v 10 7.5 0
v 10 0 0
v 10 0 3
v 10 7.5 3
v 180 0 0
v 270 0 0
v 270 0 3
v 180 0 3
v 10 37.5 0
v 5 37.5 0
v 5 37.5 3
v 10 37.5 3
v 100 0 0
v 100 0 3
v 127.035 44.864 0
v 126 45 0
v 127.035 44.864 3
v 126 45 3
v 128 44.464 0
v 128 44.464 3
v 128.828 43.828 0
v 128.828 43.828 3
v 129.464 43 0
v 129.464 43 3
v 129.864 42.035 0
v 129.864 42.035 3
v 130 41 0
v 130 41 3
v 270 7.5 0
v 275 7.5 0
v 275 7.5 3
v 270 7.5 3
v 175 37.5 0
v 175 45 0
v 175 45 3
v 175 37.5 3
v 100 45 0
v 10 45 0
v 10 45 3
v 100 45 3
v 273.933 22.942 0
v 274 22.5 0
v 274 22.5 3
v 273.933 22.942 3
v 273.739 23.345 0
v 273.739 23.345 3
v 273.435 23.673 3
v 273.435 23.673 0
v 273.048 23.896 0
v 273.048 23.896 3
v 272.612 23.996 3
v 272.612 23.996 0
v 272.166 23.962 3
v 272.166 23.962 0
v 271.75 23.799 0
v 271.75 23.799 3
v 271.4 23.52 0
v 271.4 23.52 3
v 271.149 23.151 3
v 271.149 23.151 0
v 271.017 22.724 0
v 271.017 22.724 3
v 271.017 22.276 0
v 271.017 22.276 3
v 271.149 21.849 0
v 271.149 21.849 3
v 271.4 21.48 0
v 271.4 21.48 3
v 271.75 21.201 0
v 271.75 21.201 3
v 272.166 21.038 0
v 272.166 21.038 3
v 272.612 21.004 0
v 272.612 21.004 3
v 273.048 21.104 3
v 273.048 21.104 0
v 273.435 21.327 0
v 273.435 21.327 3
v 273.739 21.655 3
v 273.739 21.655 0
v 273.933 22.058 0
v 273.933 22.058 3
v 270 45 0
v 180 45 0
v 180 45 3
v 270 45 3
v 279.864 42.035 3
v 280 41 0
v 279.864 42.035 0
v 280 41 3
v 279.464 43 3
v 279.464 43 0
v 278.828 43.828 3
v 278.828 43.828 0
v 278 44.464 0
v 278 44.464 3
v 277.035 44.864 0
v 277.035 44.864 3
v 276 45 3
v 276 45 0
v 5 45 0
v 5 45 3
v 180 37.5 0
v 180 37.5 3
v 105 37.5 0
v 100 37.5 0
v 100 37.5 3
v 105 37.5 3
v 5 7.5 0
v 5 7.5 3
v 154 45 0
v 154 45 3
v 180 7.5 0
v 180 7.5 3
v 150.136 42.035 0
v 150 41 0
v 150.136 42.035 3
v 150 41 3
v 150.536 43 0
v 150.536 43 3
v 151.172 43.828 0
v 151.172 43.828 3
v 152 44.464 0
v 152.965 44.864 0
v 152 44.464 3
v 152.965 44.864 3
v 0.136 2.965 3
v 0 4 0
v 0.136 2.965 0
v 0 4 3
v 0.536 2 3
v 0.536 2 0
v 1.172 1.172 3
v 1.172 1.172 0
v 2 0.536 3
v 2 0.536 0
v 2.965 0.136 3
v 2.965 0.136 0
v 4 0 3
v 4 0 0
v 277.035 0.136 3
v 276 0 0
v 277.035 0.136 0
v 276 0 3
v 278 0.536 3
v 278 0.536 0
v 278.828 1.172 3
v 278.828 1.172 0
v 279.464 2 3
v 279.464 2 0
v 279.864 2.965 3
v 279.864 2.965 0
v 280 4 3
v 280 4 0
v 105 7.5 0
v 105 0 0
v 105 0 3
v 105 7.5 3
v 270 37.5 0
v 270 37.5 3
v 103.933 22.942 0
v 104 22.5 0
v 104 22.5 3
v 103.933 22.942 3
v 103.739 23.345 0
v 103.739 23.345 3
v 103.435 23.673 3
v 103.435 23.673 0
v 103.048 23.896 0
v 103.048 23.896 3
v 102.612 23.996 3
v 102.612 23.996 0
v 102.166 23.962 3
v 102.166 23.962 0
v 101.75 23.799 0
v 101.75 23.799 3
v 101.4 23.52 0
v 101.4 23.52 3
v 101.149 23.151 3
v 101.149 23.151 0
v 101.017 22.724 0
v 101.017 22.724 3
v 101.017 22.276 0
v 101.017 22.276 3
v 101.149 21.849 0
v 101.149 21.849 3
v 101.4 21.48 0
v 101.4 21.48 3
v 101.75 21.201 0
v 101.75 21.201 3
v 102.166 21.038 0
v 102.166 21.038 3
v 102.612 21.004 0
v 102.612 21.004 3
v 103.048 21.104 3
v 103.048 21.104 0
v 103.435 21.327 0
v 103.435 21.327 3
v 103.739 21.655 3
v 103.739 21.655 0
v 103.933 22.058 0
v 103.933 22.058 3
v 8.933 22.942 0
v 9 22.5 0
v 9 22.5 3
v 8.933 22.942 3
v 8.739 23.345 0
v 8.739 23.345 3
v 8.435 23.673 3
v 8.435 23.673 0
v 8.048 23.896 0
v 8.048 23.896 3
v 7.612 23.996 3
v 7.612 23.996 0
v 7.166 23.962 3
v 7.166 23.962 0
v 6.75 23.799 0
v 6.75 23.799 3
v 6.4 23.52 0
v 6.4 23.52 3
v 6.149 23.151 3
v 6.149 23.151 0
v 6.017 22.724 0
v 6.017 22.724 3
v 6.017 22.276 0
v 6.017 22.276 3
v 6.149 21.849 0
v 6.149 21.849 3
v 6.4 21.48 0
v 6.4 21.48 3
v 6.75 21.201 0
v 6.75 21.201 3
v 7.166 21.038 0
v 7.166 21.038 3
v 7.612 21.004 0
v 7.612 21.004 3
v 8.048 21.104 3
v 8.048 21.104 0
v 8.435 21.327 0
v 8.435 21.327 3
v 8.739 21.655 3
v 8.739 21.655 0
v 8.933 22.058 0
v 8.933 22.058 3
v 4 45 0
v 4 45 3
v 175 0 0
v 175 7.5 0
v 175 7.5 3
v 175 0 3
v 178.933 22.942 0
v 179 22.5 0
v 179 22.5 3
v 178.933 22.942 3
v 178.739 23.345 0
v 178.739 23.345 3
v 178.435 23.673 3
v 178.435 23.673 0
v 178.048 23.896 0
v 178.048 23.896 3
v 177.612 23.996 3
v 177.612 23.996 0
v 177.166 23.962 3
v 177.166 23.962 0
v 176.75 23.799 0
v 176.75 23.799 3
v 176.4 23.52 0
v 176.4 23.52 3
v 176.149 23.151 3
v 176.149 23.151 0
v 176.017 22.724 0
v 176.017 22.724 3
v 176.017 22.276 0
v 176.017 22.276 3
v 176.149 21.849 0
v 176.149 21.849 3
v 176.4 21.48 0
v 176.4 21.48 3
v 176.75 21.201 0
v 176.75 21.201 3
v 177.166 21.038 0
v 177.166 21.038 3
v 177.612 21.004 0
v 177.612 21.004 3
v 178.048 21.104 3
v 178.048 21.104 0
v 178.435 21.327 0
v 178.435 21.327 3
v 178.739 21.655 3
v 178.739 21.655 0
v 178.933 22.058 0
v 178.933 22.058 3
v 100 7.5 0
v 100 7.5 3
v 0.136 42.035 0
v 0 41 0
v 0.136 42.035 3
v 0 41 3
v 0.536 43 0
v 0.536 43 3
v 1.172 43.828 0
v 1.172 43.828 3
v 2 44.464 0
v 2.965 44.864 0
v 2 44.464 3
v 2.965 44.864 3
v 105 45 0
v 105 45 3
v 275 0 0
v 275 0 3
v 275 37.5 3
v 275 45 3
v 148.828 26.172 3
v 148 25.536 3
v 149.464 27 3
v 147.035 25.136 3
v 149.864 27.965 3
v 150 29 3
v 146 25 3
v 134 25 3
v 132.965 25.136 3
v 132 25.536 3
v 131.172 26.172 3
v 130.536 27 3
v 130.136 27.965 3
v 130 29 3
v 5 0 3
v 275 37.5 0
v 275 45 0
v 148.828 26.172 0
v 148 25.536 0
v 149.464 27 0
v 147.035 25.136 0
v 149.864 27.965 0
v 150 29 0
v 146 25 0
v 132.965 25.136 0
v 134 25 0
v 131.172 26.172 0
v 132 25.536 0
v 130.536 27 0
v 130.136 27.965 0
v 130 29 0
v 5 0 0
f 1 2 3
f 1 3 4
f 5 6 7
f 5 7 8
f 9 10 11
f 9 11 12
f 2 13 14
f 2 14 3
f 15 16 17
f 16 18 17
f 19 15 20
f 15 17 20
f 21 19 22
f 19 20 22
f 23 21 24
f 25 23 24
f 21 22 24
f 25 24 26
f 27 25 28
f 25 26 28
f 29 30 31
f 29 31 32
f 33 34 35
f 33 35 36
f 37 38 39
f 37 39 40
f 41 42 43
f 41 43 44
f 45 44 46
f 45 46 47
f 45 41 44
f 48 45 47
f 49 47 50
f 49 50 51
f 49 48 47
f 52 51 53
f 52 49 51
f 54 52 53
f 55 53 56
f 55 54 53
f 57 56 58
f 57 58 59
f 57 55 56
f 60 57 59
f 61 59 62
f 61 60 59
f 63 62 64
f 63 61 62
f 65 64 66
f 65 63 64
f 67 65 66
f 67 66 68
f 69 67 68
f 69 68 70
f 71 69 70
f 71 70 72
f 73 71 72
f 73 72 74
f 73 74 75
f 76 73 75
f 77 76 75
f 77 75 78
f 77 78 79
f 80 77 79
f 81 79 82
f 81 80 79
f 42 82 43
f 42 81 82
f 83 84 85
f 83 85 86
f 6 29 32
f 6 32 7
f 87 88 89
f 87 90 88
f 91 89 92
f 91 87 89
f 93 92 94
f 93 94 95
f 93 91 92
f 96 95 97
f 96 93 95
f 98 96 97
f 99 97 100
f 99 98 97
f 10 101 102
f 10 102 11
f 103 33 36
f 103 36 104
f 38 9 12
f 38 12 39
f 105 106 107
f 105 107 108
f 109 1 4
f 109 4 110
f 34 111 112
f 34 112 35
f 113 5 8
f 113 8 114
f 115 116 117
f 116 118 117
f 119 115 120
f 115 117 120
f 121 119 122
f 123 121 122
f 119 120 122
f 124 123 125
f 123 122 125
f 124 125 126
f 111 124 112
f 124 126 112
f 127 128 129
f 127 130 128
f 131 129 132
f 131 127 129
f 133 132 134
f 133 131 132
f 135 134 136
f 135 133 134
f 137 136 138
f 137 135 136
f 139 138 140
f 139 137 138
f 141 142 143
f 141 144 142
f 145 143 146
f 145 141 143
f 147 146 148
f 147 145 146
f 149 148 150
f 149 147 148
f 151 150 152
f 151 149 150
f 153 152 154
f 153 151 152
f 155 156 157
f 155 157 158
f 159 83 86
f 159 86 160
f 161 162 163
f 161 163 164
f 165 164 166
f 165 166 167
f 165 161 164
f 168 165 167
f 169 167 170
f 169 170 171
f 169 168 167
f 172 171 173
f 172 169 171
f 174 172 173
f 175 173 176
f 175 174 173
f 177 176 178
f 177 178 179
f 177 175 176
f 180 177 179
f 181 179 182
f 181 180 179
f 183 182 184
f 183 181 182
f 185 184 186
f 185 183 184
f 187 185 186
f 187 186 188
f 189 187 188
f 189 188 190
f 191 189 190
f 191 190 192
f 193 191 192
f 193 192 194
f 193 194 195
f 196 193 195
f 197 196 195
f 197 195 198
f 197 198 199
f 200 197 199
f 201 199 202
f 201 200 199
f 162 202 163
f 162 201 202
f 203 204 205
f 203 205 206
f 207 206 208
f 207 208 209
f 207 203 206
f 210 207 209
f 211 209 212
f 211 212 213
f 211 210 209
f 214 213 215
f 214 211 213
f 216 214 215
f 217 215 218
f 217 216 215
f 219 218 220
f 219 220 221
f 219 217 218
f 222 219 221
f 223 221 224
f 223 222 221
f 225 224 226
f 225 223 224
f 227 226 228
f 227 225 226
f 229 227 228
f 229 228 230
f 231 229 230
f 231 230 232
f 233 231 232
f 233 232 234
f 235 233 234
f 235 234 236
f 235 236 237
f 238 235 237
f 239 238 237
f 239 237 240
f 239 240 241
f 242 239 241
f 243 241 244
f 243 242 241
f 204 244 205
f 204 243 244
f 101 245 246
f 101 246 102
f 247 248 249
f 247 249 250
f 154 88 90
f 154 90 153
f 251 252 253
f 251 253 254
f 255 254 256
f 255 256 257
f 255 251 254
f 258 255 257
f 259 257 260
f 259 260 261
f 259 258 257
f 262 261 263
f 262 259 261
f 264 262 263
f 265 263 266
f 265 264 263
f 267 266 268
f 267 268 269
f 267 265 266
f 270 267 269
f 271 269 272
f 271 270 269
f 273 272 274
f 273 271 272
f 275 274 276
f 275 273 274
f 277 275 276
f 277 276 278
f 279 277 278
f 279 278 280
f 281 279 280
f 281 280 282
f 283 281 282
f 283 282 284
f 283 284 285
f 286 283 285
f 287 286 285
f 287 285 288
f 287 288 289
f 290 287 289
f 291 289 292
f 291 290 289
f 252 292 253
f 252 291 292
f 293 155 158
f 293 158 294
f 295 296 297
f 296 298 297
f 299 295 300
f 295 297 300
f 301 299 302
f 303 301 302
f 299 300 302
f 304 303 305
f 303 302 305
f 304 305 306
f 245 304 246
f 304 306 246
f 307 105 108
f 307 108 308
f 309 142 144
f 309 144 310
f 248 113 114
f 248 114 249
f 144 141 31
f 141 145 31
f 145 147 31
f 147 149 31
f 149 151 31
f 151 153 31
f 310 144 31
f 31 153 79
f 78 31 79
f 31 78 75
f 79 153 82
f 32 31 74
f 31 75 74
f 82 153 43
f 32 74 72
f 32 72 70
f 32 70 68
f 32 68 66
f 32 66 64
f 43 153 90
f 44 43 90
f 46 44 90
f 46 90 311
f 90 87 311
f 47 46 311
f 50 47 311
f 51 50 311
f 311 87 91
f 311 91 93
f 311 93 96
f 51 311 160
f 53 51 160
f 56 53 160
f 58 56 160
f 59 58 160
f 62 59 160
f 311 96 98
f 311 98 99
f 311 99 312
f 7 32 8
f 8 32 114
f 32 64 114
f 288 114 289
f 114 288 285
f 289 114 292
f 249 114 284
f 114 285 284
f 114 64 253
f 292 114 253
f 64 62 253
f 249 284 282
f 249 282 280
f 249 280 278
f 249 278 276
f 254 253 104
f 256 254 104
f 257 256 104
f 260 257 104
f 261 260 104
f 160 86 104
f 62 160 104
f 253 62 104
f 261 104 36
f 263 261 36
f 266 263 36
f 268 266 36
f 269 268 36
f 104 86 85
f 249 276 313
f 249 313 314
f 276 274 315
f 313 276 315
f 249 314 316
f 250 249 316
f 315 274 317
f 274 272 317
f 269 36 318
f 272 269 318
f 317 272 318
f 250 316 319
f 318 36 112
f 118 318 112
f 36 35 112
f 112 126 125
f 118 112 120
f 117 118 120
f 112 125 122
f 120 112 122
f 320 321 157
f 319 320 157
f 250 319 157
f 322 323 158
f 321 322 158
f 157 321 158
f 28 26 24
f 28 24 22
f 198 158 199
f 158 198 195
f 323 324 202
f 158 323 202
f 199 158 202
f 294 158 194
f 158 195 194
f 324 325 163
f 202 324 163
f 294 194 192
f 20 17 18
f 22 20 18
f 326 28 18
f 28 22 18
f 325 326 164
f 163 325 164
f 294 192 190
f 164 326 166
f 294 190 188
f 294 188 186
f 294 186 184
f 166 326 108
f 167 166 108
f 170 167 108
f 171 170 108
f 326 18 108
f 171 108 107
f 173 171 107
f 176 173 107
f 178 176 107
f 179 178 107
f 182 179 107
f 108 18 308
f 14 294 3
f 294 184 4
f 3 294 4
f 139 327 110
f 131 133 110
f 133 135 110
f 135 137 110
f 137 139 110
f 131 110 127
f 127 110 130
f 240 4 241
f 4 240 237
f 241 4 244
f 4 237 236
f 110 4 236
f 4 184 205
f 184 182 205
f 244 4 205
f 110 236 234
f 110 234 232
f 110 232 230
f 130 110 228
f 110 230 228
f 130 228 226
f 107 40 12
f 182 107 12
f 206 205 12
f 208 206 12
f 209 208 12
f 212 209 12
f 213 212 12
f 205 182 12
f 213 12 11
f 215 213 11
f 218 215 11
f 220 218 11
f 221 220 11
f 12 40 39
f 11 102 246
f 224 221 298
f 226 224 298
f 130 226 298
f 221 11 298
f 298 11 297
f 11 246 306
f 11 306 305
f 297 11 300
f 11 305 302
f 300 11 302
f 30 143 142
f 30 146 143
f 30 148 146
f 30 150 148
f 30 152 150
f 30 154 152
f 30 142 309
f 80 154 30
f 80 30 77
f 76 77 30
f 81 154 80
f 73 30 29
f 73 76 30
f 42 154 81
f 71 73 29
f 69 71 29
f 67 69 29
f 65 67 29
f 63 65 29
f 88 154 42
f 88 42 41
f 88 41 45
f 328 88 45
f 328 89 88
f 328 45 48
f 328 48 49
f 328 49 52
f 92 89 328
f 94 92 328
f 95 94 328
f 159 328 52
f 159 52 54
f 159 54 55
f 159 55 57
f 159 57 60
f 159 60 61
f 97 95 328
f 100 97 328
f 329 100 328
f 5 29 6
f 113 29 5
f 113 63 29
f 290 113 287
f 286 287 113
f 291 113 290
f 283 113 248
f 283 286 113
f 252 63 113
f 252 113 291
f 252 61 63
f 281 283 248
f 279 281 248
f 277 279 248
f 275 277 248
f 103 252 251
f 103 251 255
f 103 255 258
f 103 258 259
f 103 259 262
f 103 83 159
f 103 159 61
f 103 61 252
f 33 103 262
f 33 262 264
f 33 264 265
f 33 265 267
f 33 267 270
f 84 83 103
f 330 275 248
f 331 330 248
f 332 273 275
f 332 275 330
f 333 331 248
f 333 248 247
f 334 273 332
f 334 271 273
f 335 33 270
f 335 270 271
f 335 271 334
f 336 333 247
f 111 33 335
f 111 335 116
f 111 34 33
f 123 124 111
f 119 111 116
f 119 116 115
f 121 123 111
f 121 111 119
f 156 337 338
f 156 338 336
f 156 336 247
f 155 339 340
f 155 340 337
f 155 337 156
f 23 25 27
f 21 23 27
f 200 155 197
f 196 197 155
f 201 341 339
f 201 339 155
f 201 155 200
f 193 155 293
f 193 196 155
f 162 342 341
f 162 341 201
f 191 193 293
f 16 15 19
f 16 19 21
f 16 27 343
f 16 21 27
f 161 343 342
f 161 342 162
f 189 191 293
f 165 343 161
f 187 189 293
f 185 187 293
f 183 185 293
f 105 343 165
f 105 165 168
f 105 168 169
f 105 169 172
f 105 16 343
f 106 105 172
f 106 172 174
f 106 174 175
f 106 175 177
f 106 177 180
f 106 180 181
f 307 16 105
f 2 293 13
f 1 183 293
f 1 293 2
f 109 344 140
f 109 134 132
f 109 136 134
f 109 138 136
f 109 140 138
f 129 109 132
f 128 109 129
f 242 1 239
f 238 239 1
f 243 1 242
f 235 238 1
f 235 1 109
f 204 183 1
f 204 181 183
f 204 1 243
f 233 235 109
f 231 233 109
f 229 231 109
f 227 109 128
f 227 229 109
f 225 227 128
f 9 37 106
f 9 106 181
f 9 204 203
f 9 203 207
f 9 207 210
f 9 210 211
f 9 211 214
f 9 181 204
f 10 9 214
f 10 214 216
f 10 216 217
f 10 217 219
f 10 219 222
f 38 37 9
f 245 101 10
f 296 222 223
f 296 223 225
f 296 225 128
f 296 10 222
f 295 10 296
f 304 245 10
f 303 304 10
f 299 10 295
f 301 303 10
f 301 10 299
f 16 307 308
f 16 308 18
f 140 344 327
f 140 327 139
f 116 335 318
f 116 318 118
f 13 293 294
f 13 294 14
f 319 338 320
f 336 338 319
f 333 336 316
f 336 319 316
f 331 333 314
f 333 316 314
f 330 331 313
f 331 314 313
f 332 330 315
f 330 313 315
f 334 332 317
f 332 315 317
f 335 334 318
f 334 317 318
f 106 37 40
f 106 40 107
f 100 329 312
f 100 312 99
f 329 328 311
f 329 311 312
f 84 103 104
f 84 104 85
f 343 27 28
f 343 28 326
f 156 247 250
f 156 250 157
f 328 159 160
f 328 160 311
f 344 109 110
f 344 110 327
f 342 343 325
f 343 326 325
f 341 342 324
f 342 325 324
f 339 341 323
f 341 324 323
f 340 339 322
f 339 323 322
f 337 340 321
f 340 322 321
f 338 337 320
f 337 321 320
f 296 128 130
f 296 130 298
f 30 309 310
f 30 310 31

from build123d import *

# Parameters (mm, degrees)
ESQUISSE1_R        = 1.5
BOSS_EXTRU_1_DEPTH = 3
CONG_1_R           = 4


with BuildPart() as part:
    # Esquisse1 → Boss.-Extru.1 (new body)
    with BuildSketch(Plane.XY):
        Polygon((0, 0), (0, 45), (5, 45), (5, 37.5), (10, 37.5), (10, 45), (100, 45), (100, 37.5), (105, 37.5), (105, 45), (130, 45), (130, 25), (150, 25), (150, 45), (175, 45), (175, 37.5), (180, 37.5), (180, 45), (270, 45), (270, 37.5), (275, 37.5), (275, 45), (280, 45), (280, 0), (275, 0), (275, 7.5), (270, 7.5), (270, 0), (180, 0), (180, 7.5), (175, 7.5), (175, 0), (105, 0), (105, 7.5), (100, 7.5), (100, 0), (10, 0), (10, 7.5), (5, 7.5), (5, 0), align=None)
        with Locations((7.5, 22.5)):
            Circle(ESQUISSE1_R, mode=Mode.SUBTRACT)
        with Locations((102.5, 22.5)):
            Circle(ESQUISSE1_R, mode=Mode.SUBTRACT)
        with Locations((177.5, 22.5)):
            Circle(ESQUISSE1_R, mode=Mode.SUBTRACT)
        with Locations((272.5, 22.5)):
            Circle(ESQUISSE1_R, mode=Mode.SUBTRACT)
    extrude(amount=BOSS_EXTRU_1_DEPTH)

    # Congé1
    cong_1_edges = [part.edges().sort_by_distance(p)[0] for p in [
        (0, 0, 1.5),
        (0, 45, 1.5),
        (130, 45, 1.5),
        (130, 25, 1.5),
        (150, 25, 1.5),
        (150, 45, 1.5),
        (280, 45, 1.5),
        (280, 0, 1.5),
    ]]
    fillet(cong_1_edges, radius=CONG_1_R)


solid = part.part
